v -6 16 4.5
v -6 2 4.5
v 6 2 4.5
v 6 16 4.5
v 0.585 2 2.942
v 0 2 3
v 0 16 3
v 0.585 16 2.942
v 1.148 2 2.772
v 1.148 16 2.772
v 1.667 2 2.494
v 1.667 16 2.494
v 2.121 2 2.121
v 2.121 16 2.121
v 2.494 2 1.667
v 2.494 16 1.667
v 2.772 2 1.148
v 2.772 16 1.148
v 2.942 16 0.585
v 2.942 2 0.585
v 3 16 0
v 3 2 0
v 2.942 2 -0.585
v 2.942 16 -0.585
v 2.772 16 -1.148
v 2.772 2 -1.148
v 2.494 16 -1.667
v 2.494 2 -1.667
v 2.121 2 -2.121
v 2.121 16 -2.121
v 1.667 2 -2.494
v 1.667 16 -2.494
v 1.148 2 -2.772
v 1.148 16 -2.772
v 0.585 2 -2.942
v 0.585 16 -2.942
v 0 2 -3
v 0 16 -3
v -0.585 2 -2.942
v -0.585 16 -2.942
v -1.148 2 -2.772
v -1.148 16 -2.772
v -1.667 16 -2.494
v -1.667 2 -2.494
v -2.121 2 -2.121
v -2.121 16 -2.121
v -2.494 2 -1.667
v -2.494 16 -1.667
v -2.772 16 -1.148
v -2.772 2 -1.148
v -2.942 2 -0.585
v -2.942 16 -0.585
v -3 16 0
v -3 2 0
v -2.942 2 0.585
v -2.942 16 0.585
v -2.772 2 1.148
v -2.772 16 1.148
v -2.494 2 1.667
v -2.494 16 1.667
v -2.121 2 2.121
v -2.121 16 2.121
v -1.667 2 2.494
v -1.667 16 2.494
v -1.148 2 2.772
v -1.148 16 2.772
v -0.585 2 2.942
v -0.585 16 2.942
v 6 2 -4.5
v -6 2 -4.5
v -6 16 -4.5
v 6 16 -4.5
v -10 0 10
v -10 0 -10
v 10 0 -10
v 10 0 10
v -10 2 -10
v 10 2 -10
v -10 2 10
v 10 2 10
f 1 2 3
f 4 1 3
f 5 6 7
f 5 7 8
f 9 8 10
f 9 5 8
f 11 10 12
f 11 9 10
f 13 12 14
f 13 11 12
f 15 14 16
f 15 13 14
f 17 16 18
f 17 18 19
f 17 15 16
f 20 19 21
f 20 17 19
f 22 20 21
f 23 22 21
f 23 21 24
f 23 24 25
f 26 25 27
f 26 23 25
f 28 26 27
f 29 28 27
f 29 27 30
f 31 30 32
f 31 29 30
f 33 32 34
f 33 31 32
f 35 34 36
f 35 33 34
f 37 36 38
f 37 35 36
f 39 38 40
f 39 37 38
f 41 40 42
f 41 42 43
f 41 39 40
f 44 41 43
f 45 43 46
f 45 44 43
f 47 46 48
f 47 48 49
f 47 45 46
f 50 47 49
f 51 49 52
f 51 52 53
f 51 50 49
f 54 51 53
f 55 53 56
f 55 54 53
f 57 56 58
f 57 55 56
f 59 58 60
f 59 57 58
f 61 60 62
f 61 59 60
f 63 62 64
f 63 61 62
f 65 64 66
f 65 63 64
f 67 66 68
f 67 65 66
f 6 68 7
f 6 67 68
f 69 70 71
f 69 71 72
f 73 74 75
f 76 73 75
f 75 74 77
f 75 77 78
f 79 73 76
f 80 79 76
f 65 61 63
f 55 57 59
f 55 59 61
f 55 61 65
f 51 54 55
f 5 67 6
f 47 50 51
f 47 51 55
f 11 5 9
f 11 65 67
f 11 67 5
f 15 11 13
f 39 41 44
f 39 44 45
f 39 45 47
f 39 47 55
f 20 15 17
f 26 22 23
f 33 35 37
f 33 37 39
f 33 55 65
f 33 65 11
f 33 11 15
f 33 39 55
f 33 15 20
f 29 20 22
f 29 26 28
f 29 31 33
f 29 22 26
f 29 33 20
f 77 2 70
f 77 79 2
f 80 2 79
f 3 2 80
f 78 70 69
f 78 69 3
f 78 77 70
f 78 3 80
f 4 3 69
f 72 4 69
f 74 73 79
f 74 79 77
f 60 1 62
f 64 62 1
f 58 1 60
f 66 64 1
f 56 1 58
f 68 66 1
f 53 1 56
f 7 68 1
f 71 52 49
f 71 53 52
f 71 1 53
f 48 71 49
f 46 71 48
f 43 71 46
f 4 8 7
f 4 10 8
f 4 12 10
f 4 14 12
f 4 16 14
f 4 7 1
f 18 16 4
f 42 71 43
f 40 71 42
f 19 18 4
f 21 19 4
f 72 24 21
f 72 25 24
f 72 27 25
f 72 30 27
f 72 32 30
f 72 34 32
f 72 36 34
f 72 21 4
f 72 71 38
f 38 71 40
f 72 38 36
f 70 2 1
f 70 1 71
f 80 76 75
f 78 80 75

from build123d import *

# Parameters (mm, degrees)
SKETCH_1_W      = 20
SKETCH_1_H      = 20
EXTRUDE_1_DEPTH = 2
SKETCH_2_W      = 12
SKETCH_2_H      = 9
SKETCH_2_R      = 3
EXTRUDE_2_DEPTH = 14


with BuildPart() as part:
    # 草图1 → 凸台-拉伸1 (new body)
    with BuildSketch(Plane(origin=(0, 0, 0), x_dir=(1, 0, 0), z_dir=(0, 1, 0))):
        Rectangle(SKETCH_1_W, SKETCH_1_H)
    extrude(amount=EXTRUDE_1_DEPTH)

    # 草图2 → 凸台-拉伸2 (add)
    with BuildSketch(Plane(origin=(0, 2, 0), x_dir=(1, 0, 0), z_dir=(0, 1, 0))):
        Rectangle(SKETCH_2_W, SKETCH_2_H)
        with Locations(Location((0, 0, 0), (0, 0, 270))):
            Circle(SKETCH_2_R, mode=Mode.SUBTRACT)
    extrude(amount=EXTRUDE_2_DEPTH)


solid = part.part
